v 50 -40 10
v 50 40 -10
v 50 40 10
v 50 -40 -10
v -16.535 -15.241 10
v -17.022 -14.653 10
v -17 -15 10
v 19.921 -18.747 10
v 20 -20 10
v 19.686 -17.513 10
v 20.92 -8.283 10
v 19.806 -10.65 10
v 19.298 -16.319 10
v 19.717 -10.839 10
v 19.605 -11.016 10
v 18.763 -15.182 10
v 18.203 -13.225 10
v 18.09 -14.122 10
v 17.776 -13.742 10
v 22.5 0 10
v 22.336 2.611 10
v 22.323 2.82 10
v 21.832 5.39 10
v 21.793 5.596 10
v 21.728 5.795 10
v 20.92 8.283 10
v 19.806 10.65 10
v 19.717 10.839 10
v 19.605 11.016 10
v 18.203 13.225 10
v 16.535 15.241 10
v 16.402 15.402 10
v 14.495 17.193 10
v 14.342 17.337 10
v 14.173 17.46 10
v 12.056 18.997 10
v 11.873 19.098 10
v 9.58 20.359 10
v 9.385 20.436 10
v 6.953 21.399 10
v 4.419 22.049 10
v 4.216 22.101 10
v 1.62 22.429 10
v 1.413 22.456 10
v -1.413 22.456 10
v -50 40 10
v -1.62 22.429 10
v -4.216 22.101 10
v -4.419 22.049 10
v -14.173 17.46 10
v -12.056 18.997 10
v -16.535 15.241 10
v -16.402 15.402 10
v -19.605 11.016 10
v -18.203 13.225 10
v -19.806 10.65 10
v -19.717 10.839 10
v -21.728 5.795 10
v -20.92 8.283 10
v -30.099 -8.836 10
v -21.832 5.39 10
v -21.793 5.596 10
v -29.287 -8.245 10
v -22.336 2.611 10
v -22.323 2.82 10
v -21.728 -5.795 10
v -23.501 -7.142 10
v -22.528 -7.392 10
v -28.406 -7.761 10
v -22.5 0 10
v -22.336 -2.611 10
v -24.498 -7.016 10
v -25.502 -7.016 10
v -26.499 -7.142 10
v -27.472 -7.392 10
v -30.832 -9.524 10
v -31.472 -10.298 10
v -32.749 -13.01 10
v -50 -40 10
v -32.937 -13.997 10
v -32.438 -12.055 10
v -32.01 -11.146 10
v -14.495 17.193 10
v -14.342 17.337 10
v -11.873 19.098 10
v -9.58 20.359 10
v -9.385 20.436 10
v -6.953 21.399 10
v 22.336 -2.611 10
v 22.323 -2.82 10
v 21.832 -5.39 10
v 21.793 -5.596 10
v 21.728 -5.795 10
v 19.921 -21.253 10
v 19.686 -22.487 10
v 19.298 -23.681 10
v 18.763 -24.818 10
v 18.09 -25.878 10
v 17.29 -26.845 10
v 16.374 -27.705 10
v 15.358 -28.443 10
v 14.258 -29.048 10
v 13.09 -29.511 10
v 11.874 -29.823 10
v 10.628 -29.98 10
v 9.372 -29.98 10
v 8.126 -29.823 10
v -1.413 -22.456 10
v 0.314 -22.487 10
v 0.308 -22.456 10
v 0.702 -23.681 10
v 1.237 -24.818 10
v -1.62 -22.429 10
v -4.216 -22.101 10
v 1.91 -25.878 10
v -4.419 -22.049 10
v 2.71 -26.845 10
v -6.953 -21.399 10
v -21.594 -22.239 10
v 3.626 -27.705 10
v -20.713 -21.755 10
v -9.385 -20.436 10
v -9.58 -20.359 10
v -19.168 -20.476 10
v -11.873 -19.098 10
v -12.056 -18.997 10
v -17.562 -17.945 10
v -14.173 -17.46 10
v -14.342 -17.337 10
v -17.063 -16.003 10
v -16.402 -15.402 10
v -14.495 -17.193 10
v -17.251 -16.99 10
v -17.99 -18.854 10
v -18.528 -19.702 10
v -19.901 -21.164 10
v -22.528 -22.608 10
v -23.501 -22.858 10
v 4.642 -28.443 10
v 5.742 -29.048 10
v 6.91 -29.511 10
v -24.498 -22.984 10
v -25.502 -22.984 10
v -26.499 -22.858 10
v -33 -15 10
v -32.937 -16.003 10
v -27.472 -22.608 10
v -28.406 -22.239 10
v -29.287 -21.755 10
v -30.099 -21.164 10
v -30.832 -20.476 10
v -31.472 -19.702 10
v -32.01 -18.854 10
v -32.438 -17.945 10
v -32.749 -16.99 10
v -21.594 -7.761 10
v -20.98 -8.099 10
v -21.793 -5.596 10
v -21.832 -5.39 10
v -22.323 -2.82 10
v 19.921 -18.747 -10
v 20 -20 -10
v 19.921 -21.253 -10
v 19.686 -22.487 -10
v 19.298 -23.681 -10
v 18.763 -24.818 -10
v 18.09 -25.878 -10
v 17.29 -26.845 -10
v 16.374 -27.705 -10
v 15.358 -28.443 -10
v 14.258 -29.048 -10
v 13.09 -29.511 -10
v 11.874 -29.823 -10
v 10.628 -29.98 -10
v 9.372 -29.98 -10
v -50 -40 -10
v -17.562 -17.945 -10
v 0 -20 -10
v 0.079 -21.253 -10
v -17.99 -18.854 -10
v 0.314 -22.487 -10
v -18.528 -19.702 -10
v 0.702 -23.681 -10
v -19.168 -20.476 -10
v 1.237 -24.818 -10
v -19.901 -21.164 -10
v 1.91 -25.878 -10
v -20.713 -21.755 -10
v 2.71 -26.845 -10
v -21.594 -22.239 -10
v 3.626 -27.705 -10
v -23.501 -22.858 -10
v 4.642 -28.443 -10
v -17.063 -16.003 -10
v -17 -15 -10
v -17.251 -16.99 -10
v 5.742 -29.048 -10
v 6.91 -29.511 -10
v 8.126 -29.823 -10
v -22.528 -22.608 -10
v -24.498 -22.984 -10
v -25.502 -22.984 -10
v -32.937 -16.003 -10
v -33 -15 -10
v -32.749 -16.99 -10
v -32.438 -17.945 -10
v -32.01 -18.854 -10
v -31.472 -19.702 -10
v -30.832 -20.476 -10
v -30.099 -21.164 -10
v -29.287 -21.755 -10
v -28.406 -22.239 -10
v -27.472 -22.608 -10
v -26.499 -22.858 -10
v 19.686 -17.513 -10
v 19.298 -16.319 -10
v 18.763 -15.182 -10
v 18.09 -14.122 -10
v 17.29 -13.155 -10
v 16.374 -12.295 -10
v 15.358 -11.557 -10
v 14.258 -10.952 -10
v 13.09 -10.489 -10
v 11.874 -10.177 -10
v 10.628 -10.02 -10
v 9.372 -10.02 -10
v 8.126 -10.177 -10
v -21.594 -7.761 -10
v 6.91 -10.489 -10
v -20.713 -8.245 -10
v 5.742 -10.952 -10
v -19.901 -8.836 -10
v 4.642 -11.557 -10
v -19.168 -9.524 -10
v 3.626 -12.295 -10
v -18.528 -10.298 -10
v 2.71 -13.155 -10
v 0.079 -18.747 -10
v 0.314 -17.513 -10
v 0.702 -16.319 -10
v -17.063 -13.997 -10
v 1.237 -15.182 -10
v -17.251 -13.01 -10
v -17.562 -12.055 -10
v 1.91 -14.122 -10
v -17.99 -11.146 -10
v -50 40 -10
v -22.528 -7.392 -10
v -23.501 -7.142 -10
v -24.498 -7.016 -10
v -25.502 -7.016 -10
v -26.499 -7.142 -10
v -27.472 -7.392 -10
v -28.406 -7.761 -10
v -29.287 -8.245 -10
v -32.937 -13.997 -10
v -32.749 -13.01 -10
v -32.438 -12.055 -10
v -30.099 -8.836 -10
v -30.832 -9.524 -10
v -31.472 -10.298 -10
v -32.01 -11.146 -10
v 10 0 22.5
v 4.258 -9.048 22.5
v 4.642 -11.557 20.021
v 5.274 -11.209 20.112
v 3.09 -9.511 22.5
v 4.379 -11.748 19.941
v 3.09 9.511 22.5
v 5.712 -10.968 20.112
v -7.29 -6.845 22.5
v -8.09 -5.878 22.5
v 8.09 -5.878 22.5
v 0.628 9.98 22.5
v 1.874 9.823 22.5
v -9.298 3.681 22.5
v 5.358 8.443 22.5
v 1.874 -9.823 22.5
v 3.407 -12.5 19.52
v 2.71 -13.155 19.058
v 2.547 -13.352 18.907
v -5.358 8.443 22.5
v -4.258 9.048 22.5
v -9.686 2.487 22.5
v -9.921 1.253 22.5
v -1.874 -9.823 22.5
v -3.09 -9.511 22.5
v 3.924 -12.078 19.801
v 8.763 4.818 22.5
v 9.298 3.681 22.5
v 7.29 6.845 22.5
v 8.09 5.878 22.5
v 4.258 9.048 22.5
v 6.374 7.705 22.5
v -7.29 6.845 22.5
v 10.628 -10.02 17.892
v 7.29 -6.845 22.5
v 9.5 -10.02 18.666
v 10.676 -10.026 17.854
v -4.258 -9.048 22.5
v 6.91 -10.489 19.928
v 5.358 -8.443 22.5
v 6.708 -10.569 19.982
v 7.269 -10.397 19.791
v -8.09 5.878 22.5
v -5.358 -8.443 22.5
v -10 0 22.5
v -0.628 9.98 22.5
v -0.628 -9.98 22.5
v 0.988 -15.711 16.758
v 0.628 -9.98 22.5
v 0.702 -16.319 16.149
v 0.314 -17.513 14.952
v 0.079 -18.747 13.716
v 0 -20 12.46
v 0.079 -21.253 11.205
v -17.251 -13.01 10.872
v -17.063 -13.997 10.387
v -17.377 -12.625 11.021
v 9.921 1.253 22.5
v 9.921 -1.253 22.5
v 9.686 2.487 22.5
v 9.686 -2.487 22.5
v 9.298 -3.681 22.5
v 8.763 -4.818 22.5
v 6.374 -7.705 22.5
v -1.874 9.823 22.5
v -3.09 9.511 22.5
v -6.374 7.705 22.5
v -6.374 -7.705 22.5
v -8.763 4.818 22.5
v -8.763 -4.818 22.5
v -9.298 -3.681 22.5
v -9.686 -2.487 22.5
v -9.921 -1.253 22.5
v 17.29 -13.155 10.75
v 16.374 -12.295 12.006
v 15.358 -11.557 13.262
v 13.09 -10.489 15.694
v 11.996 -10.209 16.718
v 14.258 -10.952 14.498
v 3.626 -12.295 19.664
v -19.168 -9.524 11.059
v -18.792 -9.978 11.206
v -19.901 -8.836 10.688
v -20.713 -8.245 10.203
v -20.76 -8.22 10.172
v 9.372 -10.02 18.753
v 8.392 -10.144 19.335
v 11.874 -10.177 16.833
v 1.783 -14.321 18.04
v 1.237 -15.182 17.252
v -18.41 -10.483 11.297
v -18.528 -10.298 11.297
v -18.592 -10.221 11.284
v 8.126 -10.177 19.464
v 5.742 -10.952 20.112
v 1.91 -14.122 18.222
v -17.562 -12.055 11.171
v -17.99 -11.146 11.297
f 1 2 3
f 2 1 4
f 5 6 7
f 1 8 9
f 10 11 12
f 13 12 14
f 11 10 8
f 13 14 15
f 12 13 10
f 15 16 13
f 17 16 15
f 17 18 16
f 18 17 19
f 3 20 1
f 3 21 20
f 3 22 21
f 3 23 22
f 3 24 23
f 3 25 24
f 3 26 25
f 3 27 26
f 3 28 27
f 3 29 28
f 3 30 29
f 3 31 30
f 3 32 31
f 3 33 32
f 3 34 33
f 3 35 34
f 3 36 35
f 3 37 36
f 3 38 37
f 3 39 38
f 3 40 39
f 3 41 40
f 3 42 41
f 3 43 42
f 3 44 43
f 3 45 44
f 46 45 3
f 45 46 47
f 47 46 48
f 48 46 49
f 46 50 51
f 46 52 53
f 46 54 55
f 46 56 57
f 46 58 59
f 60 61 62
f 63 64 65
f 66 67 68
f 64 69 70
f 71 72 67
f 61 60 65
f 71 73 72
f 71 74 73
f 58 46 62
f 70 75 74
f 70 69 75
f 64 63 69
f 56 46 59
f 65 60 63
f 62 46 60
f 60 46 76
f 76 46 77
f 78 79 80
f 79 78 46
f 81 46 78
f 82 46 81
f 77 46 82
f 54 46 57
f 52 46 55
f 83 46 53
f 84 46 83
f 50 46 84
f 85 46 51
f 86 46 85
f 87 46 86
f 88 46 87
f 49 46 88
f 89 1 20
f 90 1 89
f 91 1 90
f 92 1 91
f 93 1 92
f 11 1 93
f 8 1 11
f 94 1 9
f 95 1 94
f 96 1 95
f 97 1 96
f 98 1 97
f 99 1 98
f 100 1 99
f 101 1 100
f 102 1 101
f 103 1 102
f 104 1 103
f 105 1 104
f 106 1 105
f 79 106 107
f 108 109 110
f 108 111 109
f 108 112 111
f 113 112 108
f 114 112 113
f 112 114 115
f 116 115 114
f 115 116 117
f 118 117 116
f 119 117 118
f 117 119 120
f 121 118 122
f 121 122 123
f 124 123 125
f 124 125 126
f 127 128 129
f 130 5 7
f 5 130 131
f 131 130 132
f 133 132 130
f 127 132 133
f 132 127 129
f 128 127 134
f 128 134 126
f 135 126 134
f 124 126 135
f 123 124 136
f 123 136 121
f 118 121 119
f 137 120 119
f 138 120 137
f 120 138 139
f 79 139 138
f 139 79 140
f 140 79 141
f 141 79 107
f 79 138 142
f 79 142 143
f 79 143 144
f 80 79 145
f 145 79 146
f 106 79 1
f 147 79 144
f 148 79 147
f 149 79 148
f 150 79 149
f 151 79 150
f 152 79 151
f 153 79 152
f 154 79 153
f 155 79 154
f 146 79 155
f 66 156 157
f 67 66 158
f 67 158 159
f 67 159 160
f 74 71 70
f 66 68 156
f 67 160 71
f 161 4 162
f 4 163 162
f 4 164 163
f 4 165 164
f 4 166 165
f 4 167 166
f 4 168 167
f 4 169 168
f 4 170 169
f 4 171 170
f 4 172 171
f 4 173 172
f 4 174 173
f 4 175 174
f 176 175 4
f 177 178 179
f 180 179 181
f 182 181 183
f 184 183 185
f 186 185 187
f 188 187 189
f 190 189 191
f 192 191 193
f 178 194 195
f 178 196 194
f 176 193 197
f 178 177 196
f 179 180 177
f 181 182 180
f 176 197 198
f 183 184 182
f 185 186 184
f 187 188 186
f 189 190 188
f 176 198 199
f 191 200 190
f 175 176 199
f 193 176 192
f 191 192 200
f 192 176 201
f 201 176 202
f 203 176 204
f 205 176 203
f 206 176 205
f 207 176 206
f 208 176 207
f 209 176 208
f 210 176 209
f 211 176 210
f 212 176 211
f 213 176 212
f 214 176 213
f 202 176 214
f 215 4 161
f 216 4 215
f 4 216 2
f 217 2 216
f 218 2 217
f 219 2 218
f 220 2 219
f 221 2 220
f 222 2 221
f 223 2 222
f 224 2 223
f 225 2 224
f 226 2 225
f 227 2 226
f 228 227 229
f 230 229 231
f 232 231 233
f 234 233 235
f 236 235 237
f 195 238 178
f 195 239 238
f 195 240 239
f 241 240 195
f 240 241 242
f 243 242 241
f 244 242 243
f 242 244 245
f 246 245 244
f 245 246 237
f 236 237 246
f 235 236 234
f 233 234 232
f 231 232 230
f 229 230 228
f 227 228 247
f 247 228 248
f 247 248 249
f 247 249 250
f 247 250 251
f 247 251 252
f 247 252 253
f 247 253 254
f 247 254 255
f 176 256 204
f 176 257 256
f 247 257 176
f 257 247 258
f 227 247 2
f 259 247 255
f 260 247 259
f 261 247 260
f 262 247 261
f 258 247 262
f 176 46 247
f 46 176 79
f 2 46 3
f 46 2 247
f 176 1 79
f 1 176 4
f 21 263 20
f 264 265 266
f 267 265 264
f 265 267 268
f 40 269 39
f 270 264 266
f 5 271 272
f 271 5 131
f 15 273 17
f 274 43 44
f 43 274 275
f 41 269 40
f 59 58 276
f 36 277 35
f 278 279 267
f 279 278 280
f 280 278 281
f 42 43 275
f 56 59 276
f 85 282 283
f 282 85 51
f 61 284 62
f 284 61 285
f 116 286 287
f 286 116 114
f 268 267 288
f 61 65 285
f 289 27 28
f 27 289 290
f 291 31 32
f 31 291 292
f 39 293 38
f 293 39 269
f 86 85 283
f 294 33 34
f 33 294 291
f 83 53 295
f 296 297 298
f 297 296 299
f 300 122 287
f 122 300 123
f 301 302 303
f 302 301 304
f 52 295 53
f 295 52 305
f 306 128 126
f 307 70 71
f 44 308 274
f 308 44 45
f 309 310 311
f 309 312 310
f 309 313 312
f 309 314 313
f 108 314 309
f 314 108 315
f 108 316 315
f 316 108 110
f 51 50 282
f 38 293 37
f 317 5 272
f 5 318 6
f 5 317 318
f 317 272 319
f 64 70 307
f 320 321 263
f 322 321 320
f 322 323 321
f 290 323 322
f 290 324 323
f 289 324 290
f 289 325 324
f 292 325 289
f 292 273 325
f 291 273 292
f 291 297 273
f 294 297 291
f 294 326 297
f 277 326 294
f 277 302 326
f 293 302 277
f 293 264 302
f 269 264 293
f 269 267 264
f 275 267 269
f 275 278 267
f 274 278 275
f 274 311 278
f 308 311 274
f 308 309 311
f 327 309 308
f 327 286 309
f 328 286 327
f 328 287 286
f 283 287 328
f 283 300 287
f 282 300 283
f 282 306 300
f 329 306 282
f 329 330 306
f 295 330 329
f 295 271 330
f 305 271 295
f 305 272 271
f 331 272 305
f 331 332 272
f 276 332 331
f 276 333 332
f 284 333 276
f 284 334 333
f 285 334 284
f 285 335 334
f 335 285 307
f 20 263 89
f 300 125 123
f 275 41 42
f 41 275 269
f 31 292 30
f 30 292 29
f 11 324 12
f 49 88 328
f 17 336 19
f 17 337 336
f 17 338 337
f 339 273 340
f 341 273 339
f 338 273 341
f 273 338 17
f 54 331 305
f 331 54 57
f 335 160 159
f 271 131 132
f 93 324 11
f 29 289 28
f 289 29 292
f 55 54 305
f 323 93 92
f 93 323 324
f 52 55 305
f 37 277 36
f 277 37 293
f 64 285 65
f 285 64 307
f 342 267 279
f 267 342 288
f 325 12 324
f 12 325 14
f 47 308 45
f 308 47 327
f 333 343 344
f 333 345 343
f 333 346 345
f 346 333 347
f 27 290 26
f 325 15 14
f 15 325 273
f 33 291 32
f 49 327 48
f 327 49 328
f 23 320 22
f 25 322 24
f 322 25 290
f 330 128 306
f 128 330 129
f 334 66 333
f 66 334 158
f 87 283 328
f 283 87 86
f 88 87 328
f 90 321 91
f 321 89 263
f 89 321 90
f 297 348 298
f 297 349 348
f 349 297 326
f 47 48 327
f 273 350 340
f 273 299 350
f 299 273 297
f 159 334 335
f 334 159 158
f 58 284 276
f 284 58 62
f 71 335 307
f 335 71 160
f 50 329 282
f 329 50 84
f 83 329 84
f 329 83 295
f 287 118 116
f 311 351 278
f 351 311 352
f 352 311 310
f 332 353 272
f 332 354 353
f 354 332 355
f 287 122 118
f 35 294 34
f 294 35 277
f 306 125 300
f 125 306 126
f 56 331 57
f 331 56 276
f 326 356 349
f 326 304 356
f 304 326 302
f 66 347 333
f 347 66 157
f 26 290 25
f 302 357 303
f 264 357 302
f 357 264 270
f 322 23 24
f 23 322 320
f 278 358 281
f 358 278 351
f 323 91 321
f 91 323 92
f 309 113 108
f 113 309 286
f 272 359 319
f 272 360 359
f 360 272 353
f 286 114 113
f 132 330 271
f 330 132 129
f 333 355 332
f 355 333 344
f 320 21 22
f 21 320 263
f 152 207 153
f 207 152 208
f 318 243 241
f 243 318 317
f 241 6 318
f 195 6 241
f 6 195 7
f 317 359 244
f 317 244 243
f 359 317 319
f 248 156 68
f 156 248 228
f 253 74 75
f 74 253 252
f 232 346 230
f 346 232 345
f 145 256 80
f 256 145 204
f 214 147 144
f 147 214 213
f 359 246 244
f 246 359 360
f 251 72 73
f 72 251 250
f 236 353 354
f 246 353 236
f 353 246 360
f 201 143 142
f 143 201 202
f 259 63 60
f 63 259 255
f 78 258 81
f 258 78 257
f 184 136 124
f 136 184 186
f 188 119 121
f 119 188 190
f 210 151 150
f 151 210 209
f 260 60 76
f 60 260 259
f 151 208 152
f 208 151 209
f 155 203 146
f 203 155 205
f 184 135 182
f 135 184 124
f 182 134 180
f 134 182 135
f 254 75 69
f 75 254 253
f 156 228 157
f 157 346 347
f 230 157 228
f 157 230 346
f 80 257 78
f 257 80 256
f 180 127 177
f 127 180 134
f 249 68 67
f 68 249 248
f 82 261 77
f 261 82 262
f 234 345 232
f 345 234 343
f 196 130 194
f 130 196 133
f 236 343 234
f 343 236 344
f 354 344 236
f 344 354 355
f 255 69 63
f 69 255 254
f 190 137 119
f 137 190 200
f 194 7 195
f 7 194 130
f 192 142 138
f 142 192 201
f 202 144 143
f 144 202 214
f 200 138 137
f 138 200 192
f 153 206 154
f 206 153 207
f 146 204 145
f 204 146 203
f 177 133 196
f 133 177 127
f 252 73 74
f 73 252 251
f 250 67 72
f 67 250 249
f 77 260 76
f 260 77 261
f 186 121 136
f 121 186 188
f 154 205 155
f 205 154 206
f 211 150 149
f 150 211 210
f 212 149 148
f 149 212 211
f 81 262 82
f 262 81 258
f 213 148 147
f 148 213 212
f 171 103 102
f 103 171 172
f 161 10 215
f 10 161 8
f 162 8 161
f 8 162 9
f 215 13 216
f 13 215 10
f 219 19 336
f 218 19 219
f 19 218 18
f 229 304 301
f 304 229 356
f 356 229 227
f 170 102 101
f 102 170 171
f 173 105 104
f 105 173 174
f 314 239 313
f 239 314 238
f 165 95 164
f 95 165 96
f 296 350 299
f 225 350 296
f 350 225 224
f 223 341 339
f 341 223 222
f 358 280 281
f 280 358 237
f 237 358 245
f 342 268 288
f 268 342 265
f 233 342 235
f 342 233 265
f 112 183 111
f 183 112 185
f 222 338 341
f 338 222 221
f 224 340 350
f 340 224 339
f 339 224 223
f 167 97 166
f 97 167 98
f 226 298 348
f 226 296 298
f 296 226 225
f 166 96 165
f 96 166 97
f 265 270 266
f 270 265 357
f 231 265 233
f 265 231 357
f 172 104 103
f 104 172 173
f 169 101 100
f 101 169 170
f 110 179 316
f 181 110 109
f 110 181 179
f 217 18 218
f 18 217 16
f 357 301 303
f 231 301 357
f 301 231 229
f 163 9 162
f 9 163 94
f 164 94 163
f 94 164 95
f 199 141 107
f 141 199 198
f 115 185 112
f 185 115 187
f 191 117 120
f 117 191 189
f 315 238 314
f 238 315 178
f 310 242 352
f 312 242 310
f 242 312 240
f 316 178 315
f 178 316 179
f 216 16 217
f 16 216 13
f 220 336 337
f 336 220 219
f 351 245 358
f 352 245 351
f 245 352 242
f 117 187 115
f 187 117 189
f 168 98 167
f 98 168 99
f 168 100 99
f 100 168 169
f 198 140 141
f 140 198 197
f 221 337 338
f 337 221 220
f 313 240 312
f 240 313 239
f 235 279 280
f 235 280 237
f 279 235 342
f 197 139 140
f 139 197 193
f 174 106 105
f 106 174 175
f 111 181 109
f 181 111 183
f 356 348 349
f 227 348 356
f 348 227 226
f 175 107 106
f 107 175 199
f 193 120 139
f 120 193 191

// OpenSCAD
// Auto-generated CAD model from Hand-Drawn Sketch Pipeline
$fn = 50;

difference() {
    union() {
        // Base Extrusion Block
        cube([100, 80, 20], center=true);
        // Top Pyramid / Frustum Protrusion
        translate([0, 0, 15])
            cylinder(h=15, r1=25, r2=10, center=true);
    }
    // Through-Hole Cutouts
    translate([-25, -15, 0])
        cylinder(h=50, r=8, center=true);
    translate([10, -20, 0])
        cylinder(h=50, r=10, center=true);
}
